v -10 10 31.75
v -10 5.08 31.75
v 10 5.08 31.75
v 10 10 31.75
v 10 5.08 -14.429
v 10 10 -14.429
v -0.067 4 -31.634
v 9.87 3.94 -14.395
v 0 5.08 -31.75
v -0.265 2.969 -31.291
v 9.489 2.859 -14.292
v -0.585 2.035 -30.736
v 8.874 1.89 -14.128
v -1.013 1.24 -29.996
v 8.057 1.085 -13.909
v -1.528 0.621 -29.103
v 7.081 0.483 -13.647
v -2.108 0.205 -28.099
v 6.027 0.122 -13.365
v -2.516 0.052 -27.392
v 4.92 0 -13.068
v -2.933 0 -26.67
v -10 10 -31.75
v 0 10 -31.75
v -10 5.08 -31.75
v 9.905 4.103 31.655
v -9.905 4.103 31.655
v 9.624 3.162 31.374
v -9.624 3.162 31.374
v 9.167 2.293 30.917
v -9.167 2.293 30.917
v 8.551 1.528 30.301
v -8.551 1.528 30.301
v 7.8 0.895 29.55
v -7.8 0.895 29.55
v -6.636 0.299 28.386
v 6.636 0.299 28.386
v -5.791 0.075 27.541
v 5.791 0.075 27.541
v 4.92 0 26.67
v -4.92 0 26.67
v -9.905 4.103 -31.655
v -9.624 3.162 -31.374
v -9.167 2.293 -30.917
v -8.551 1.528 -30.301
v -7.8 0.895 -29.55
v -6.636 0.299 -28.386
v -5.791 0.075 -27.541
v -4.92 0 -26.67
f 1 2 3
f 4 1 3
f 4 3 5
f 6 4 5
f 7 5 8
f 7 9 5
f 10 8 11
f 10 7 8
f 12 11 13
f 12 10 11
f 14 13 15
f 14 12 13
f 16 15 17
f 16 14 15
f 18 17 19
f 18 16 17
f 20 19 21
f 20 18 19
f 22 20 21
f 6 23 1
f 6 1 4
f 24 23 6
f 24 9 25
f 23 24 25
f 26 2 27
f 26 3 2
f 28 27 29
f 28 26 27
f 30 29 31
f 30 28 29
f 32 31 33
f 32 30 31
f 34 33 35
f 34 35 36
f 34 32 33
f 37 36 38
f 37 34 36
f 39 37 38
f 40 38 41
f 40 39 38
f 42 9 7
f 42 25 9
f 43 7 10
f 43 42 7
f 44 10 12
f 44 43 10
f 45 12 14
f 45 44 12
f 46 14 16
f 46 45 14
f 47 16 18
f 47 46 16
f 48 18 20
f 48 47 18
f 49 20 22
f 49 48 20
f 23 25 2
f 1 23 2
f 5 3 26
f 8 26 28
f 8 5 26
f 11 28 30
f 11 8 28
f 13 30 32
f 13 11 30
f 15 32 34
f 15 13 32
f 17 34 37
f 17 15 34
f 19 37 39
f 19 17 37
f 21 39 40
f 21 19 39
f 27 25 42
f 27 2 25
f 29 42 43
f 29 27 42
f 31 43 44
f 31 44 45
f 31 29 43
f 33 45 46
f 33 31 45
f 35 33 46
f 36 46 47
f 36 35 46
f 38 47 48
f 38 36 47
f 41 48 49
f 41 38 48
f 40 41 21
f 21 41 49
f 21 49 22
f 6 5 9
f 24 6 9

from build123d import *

# Parameters (mm, degrees)
BOSS_EXTRUDE1_DEPTH = 10
FILLET1_R           = 5.08


with BuildPart() as part:
    # Sketch1 → Boss-Extrude1 (new body)
    with BuildSketch(Plane(origin=(0, 0, 0), x_dir=(1, 0, 0), z_dir=(0, 1, 0))):
        Polygon((10, -31.75), (10, 14.429491924), (0, 31.75), (-10, 31.75), (-10, -31.75), align=None)
    extrude(amount=BOSS_EXTRUDE1_DEPTH)

    # Fillet1
    fillet1_edges = [part.edges().sort_by_distance(p)[0] for p in [
        (-10, 0, 0),
        (-5, 0, -31.75),
        (5, 0, -23.089745962),
        (10, 0, 8.660254038),
        (0, 0, 31.75),
    ]]
    fillet(fillet1_edges, radius=FILLET1_R)


solid = part.part
